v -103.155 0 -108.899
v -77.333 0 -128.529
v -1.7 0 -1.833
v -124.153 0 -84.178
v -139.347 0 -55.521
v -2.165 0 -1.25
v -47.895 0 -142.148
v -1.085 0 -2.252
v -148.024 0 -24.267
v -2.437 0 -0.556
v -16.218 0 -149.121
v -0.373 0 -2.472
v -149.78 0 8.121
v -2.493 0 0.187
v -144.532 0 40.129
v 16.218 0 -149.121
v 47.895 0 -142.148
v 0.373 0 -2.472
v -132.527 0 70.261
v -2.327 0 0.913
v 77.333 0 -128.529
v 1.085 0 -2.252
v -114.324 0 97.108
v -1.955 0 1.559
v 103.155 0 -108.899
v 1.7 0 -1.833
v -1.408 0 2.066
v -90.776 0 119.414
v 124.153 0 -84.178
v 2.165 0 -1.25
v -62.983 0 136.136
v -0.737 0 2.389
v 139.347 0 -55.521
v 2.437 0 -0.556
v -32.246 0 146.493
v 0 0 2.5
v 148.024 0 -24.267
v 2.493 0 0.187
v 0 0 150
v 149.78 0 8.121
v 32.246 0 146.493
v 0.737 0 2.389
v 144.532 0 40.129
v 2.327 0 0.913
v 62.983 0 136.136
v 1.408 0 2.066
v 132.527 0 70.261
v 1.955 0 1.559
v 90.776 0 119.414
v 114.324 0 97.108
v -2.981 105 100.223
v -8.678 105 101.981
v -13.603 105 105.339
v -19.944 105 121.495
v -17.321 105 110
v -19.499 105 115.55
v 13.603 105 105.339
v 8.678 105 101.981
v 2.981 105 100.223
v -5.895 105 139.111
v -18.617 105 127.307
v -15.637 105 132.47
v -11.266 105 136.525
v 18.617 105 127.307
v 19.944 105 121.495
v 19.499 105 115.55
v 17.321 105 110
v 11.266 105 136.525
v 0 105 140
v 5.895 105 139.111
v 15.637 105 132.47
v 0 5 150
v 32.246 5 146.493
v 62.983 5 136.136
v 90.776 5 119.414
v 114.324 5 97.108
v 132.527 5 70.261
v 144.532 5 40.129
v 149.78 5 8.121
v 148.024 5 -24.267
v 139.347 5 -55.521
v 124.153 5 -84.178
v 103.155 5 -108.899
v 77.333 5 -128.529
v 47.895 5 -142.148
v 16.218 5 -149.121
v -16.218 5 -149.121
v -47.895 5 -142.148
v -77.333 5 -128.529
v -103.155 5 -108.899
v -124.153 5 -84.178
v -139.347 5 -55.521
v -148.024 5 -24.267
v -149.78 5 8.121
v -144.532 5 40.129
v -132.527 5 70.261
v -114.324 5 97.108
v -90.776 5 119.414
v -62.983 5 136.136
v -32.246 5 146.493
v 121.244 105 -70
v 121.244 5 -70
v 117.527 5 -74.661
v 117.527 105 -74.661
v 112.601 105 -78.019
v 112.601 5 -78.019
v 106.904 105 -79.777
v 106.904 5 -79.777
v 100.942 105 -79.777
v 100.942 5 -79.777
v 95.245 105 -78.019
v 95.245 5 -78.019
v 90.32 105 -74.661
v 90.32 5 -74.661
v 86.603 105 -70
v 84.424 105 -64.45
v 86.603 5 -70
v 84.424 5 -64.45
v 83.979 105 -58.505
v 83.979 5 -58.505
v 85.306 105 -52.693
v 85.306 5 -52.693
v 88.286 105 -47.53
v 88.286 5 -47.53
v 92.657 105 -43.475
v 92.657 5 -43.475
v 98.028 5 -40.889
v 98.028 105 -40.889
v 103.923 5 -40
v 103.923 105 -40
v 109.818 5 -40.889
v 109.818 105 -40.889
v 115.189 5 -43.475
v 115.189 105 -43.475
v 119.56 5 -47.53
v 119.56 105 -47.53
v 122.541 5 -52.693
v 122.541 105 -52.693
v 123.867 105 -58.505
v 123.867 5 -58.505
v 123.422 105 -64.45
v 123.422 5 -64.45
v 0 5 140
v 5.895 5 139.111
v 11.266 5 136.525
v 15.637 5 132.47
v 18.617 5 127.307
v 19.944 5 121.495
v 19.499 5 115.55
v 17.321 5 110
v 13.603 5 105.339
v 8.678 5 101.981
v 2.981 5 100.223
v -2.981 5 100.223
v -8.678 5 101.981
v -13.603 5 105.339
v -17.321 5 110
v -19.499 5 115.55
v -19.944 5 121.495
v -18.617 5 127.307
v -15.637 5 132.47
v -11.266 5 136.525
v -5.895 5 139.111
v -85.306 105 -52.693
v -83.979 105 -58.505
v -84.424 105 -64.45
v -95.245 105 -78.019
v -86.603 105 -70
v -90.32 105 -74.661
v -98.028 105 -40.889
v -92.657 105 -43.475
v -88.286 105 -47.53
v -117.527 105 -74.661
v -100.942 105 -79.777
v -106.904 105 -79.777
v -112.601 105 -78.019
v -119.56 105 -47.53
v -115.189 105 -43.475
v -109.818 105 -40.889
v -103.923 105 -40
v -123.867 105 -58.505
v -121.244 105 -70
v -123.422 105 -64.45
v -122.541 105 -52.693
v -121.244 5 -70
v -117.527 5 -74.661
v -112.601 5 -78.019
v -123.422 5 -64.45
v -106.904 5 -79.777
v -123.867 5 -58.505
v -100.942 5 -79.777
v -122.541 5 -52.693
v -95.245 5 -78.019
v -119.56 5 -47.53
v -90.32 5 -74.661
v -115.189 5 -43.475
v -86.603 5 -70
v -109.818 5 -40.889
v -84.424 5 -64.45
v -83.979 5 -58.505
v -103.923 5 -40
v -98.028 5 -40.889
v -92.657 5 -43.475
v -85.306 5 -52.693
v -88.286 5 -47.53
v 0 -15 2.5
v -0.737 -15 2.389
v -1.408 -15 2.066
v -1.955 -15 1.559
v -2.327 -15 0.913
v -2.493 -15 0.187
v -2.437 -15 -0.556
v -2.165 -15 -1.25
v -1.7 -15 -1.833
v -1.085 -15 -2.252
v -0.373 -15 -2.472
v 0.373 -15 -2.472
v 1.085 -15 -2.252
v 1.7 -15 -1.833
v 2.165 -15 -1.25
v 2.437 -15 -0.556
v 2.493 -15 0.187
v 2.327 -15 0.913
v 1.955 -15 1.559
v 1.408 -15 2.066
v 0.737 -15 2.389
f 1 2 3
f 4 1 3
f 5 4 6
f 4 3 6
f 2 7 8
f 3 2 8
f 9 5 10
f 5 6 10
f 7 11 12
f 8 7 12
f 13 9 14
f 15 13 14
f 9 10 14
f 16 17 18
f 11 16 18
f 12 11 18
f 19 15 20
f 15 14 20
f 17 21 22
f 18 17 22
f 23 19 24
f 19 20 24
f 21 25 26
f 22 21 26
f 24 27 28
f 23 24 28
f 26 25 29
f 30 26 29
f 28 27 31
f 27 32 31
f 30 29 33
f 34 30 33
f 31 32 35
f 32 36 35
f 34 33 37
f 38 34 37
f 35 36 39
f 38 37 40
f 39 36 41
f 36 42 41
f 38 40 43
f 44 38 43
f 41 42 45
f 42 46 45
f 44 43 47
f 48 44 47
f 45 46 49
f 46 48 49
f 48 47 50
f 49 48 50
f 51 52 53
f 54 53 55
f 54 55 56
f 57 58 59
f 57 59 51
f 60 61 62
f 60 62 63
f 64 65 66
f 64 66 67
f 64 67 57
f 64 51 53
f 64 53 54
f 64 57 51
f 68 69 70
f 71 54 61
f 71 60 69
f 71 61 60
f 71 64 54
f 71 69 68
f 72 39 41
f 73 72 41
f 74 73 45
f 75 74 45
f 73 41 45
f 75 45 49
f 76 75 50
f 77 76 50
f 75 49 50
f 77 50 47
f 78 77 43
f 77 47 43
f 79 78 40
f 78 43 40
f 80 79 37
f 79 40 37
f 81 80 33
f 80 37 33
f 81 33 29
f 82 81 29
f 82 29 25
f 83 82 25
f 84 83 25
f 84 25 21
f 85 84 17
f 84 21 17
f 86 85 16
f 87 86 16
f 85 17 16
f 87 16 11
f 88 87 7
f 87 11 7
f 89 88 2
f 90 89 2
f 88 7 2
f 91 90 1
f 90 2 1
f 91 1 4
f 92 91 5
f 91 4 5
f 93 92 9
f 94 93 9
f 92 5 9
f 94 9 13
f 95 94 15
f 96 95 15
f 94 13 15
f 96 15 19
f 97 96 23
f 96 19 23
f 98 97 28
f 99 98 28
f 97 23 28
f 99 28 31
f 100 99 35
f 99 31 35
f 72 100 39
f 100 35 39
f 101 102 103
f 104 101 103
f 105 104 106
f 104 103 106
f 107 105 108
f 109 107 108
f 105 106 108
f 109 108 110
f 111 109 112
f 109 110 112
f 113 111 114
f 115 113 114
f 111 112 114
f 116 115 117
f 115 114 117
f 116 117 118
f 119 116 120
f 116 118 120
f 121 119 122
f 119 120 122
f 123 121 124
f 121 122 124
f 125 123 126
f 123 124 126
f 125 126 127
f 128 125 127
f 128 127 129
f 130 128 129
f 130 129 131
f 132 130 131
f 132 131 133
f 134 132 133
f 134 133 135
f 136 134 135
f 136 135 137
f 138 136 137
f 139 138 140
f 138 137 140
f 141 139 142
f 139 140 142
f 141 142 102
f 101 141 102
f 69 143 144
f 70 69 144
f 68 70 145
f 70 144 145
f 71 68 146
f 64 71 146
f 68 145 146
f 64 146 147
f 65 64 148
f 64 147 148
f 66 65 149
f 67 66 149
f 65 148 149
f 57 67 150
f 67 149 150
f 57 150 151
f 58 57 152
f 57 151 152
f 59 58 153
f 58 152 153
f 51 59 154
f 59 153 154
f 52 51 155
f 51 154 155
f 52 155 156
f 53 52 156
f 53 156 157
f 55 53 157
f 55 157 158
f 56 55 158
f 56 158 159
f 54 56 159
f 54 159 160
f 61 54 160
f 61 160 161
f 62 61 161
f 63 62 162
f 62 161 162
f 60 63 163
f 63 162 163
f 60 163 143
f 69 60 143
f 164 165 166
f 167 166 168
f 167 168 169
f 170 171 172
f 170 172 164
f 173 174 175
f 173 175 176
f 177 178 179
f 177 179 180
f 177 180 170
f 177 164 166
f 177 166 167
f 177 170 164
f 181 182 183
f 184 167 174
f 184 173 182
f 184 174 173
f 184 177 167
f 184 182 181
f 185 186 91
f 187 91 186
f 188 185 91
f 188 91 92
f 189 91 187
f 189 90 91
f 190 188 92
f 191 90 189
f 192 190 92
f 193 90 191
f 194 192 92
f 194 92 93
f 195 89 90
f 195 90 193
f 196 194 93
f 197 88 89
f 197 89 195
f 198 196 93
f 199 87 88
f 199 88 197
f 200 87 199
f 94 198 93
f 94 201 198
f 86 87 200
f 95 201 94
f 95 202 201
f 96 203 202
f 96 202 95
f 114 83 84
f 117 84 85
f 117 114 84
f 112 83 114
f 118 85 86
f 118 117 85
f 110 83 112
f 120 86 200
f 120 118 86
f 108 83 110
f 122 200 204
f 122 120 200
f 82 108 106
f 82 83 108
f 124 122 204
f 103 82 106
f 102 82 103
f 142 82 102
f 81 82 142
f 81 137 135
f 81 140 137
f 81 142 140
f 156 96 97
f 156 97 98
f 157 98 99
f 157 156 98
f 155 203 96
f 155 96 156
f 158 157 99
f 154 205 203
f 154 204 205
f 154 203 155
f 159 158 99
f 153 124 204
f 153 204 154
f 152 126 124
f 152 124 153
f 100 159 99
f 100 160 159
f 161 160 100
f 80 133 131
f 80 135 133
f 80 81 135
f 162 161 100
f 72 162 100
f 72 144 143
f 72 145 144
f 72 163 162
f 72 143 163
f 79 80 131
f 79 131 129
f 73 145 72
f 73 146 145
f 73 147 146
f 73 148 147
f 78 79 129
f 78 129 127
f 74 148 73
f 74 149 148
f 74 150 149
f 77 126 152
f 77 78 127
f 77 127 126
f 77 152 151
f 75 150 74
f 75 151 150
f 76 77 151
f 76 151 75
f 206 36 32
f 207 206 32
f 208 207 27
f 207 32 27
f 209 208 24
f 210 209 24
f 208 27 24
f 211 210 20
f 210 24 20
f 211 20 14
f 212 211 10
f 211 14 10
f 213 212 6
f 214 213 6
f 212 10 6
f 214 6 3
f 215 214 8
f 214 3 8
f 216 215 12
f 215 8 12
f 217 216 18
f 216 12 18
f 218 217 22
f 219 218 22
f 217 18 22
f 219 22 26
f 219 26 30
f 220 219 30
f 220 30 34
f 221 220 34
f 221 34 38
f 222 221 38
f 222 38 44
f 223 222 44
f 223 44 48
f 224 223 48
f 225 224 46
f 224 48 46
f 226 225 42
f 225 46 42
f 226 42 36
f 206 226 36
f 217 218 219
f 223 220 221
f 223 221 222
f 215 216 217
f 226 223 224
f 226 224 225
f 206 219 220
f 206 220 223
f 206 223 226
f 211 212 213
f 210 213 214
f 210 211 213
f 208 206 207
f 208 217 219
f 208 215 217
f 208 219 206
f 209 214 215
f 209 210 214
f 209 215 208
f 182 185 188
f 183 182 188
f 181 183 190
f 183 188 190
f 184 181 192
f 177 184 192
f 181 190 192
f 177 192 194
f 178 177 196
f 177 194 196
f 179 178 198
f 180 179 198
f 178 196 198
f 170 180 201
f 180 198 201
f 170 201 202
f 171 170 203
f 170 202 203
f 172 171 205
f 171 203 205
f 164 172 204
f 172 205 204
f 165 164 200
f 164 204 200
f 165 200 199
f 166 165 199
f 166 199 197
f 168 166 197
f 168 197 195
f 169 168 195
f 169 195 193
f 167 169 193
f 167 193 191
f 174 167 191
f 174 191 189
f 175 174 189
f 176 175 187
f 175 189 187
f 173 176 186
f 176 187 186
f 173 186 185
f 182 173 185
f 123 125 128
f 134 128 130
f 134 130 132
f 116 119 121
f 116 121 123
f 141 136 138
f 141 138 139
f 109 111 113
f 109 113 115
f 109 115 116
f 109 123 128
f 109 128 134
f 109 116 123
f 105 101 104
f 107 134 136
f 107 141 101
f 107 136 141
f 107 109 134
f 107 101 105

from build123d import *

# Parameters (mm, degrees)
SKETCH_1_R               = 150
EXTRUDE_1_DEPTH          = 5
SKETCH_2_R               = 20
EXTRUDE_2_DEPTH          = 100
PATTERN_CIRCULAR_1_COUNT = 3
SKETCH_3_R               = 2.5
EXTRUDE_3_DEPTH          = 15


with BuildPart() as part:
    # 草图1 → 凸台-拉伸1 (new body)
    with BuildSketch(Plane(origin=(0, 0, 0), x_dir=(1, 0, 0), z_dir=(0, 1, 0))):
        with Locations(Location((0, 0, 0), (0, 0, 270))):
            Circle(SKETCH_1_R)
    extrude(amount=EXTRUDE_1_DEPTH)

    # 草图2 → 凸台-拉伸2 (add)
    with BuildSketch(Plane(origin=(0, 5, 0), x_dir=(1, 0, 0), z_dir=(0, 1, 0))):
        with Locations(Location((0, -120, 0), (0, 0, 270))):
            Circle(SKETCH_2_R)
    extrude_2 = extrude(amount=EXTRUDE_2_DEPTH)

    # 阵列(圆周)1: 凸台-拉伸2 ×3 about axis
    pattern_circular_1_axis = Axis((0, 0, 0), (0, 1, 0))
    for i in range(1, PATTERN_CIRCULAR_1_COUNT):
        add(extrude_2.rotate(pattern_circular_1_axis, i * 360 / PATTERN_CIRCULAR_1_COUNT))

    # 草图3 → 凸台-拉伸3 (add)
    with BuildSketch(Plane.XZ):
        with Locations(Location((0, 0, 0), (0, 0, 90))):
            Circle(SKETCH_3_R)
    extrude(amount=EXTRUDE_3_DEPTH)


solid = part.part
